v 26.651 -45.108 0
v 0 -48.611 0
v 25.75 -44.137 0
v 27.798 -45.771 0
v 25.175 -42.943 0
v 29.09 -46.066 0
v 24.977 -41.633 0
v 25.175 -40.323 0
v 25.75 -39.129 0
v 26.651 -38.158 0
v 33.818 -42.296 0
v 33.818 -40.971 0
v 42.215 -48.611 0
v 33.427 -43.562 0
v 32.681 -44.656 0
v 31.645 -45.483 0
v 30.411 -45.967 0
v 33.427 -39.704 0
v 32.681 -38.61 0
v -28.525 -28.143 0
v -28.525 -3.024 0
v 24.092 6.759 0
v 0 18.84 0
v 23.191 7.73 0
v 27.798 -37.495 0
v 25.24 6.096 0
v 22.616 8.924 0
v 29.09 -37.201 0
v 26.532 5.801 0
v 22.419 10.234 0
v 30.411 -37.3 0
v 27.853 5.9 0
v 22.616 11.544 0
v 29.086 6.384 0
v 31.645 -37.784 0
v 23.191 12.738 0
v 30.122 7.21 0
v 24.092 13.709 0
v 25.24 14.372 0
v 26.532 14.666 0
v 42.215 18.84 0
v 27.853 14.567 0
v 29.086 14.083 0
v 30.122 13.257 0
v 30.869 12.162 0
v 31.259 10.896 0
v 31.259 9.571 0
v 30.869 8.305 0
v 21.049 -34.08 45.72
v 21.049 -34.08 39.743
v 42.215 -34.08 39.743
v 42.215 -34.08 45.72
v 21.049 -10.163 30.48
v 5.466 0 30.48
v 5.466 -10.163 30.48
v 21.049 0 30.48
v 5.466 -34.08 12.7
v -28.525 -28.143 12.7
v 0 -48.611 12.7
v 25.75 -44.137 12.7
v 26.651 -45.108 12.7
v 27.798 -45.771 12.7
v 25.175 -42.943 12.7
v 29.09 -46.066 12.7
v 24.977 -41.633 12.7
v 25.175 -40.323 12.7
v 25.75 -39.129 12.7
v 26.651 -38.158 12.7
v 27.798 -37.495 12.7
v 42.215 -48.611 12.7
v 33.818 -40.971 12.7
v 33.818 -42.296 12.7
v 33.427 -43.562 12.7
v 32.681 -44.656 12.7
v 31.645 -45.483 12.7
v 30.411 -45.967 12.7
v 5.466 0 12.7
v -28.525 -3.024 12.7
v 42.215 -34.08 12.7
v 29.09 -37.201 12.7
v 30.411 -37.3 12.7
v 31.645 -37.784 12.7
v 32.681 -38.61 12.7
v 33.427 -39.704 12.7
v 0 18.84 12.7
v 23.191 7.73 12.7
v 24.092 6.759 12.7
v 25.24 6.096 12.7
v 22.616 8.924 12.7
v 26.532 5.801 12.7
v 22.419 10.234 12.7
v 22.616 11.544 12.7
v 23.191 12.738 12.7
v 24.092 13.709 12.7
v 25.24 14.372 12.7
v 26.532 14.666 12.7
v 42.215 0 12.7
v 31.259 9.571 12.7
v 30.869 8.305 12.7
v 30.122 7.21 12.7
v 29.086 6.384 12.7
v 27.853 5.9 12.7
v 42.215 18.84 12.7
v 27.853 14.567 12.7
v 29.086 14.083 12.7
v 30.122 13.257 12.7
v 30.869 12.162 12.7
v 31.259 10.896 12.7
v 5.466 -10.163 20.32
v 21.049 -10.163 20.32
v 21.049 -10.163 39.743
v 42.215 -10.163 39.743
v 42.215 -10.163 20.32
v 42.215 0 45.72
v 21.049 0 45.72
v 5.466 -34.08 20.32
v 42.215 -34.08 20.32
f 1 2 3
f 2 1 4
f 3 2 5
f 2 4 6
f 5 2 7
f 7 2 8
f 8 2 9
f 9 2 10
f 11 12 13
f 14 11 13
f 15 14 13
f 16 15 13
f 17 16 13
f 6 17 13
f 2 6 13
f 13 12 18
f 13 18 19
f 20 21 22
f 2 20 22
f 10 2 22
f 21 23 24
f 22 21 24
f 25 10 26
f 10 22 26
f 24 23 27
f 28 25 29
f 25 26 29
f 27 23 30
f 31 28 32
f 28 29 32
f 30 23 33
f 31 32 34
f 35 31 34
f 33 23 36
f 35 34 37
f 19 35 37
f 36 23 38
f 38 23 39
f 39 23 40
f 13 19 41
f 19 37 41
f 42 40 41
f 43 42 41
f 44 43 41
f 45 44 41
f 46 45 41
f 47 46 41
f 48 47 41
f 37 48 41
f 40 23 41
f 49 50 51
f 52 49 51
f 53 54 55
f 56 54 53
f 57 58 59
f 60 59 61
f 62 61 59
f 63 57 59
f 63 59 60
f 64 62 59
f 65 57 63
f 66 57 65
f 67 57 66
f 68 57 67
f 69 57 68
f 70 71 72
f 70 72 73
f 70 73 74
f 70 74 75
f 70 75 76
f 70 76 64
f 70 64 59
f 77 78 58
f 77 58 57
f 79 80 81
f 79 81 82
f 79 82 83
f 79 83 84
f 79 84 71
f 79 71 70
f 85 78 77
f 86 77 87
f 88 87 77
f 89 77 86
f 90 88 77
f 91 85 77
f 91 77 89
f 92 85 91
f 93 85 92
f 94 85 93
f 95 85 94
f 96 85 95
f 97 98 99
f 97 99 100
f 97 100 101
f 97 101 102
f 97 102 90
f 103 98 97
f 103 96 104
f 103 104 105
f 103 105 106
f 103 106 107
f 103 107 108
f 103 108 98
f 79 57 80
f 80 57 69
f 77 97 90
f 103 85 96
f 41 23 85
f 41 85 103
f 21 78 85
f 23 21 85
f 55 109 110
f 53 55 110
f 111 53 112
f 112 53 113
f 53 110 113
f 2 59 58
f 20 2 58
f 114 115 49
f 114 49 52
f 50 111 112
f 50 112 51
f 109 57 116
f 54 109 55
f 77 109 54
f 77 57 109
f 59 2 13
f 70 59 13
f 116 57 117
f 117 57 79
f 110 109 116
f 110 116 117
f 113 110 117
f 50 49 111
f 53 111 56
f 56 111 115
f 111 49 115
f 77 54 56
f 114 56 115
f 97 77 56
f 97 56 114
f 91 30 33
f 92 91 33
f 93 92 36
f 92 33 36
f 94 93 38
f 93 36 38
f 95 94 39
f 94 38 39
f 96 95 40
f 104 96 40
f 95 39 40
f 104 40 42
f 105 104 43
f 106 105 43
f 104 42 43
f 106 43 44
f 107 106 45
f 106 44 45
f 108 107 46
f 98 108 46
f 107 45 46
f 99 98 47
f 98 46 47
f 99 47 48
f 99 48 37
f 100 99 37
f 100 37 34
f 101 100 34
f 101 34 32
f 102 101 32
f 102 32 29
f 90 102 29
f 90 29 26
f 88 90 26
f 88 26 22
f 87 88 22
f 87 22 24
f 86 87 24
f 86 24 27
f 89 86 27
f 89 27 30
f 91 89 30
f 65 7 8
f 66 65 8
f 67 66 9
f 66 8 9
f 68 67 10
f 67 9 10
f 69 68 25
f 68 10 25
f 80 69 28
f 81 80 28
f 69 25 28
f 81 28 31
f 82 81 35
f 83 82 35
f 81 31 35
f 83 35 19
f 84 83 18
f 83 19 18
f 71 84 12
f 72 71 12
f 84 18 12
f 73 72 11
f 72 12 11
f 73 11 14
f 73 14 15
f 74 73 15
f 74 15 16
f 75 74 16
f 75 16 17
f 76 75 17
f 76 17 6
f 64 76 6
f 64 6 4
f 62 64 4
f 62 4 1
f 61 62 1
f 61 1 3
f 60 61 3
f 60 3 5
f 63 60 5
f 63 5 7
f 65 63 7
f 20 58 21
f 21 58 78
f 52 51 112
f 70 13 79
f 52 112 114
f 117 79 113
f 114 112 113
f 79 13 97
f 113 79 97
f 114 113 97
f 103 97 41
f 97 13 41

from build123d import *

# Parameters (mm, degrees)
F0_W      = 91.4067700505
F0_H      = 67.4502924085
F1_DEPTH  = 12.7
F3_DEPTH  = 25.4
F4_W      = 51.4017706737
F4_H      = 34.0803191066
F5_DEPTH  = 7.62
F6_W      = 21.1654342711
F6_H      = 34.0803191066
F7_DEPTH  = 25.4
F8_W      = 23.9177821204
F8_H      = 19.4233638573
F9_DEPTH  = 25.4
F10_W     = 14.652994927
F10_H     = 34.0803191066
F11_DEPTH = 7.62
F13_DEPTH = 10.16
F15_DEPTH = 25.4
F17_DEPTH = 25.4
F18_DEPTH = 10.16
F19_W     = 15.5833414756
F19_H     = 10.1625369862
F20_DEPTH = 10.16
F23_D     = 8.89


with BuildPart() as f1:
    # F0 (on Top) → F1 (new body)
    with BuildSketch(Plane.XY):
        with Locations((-3.4888088703, -14.8855820298)):
            Rectangle(F0_W, F0_H)
    extrude(amount=F1_DEPTH)

    # F2 (on face) → F3 (cut)
    with BuildSketch(Plane.XY.offset(12.7)):
        Polygon((-49.1921938956, 18.8395641744), (-49.1921938956, 0), (-15.6996361911, 18.8395641744), align=None)
        Polygon((-15.6996361911, -48.6107282341), (-49.1921938956, -23.0261329561), (-49.1921938956, -48.6107282341), align=None)
    extrude(amount=-F3_DEPTH, mode=Mode.SUBTRACT)

    # F4 (on face) → F5 (join)
    with BuildSketch(Plane.XY.offset(12.7)):
        with Locations((16.5136908181, -17.0401595533)):
            Rectangle(F4_W, F4_H)
    extrude(amount=F5_DEPTH)

    # F6 (on face) → F7 (join)
    with BuildSketch(Plane.XY.offset(20.32)):
        with Locations((31.6318590194, -17.0401595533)):
            Rectangle(F6_W, F6_H)
    extrude(amount=F7_DEPTH)

    # F8 (on face) → F9 (cut)
    with BuildSketch(Plane(origin=(21.0491418839, 0, 0), x_dir=(0, -1, 0), z_dir=(-1, 0, 0))):
        with Locations((22.1214280464, 30.0316819286)):
            Rectangle(F8_W, F8_H)
    extrude(amount=-F9_DEPTH, mode=Mode.SUBTRACT)

    # F10 (on face) → F11 (cut)
    with BuildSketch(Plane.XY.offset(20.32)):
        with Locations((-1.8606970552, -17.0401595533)):
            Rectangle(F10_W, F10_H)
    extrude(amount=-F11_DEPTH, mode=Mode.SUBTRACT)

    # F12 (on face) → F13 (join)
    with BuildSketch(Plane.XY.offset(20.32)):
        Polygon((21.0491418839, 0), (5.4658004083, 0), (5.4658004083, -13.4125072509), (21.0491418839, -13.4125072509), (21.0491418839, -10.1625369862), align=None)
    extrude(amount=F13_DEPTH)

    # F14 (on face) → F15 (cut)
    with BuildSketch(Plane.XY.offset(12.7)):
        Polygon((-28.525055022, -38.8135323032), (-28.525055022, 11.6252659037), (-49.1921938956, 0), (-49.1921938956, -23.0261329561), align=None)
    extrude(amount=-F15_DEPTH, mode=Mode.SUBTRACT)

    # F16 (on face) → F17 (cut)
    with BuildSketch(Plane.XY.offset(12.7)):
        Polygon((-28.525055022, 11.6252659037), (-28.525055022, -3.0236337334), (0, 18.8395641744), (-15.6996361911, 18.8395641744), align=None)
        Polygon((0, -48.6107282341), (-28.525055022, -28.1430520117), (-28.525055022, -38.8135323032), (-15.6996361911, -48.6107282341), align=None)
    extrude(amount=-F17_DEPTH, mode=Mode.SUBTRACT)

    # F18 (cut): a face of the model
    f18_faces = [f1.faces().sort_by_distance(p)[0] for p in [
        (13.2574711461, -6.7062536255, 30.48),
    ]]
    extrude(f18_faces, amount=-F18_DEPTH, mode=Mode.SUBTRACT)

    # F19 (on face) → F20 (join)
    with BuildSketch(Plane.XY.offset(20.32)):
        with Locations((13.2574711461, -5.0812684931)):
            Rectangle(F19_W, F19_H)
    extrude(amount=F20_DEPTH)

    # F23 (through all)
    with Locations(Plane.XY.offset(12.7)):
        with Locations((26.8638245761, 10.2338371798), (29.4222831726, -41.6331104934)):
            Hole(F23_D / 2)


solid = f1.part
